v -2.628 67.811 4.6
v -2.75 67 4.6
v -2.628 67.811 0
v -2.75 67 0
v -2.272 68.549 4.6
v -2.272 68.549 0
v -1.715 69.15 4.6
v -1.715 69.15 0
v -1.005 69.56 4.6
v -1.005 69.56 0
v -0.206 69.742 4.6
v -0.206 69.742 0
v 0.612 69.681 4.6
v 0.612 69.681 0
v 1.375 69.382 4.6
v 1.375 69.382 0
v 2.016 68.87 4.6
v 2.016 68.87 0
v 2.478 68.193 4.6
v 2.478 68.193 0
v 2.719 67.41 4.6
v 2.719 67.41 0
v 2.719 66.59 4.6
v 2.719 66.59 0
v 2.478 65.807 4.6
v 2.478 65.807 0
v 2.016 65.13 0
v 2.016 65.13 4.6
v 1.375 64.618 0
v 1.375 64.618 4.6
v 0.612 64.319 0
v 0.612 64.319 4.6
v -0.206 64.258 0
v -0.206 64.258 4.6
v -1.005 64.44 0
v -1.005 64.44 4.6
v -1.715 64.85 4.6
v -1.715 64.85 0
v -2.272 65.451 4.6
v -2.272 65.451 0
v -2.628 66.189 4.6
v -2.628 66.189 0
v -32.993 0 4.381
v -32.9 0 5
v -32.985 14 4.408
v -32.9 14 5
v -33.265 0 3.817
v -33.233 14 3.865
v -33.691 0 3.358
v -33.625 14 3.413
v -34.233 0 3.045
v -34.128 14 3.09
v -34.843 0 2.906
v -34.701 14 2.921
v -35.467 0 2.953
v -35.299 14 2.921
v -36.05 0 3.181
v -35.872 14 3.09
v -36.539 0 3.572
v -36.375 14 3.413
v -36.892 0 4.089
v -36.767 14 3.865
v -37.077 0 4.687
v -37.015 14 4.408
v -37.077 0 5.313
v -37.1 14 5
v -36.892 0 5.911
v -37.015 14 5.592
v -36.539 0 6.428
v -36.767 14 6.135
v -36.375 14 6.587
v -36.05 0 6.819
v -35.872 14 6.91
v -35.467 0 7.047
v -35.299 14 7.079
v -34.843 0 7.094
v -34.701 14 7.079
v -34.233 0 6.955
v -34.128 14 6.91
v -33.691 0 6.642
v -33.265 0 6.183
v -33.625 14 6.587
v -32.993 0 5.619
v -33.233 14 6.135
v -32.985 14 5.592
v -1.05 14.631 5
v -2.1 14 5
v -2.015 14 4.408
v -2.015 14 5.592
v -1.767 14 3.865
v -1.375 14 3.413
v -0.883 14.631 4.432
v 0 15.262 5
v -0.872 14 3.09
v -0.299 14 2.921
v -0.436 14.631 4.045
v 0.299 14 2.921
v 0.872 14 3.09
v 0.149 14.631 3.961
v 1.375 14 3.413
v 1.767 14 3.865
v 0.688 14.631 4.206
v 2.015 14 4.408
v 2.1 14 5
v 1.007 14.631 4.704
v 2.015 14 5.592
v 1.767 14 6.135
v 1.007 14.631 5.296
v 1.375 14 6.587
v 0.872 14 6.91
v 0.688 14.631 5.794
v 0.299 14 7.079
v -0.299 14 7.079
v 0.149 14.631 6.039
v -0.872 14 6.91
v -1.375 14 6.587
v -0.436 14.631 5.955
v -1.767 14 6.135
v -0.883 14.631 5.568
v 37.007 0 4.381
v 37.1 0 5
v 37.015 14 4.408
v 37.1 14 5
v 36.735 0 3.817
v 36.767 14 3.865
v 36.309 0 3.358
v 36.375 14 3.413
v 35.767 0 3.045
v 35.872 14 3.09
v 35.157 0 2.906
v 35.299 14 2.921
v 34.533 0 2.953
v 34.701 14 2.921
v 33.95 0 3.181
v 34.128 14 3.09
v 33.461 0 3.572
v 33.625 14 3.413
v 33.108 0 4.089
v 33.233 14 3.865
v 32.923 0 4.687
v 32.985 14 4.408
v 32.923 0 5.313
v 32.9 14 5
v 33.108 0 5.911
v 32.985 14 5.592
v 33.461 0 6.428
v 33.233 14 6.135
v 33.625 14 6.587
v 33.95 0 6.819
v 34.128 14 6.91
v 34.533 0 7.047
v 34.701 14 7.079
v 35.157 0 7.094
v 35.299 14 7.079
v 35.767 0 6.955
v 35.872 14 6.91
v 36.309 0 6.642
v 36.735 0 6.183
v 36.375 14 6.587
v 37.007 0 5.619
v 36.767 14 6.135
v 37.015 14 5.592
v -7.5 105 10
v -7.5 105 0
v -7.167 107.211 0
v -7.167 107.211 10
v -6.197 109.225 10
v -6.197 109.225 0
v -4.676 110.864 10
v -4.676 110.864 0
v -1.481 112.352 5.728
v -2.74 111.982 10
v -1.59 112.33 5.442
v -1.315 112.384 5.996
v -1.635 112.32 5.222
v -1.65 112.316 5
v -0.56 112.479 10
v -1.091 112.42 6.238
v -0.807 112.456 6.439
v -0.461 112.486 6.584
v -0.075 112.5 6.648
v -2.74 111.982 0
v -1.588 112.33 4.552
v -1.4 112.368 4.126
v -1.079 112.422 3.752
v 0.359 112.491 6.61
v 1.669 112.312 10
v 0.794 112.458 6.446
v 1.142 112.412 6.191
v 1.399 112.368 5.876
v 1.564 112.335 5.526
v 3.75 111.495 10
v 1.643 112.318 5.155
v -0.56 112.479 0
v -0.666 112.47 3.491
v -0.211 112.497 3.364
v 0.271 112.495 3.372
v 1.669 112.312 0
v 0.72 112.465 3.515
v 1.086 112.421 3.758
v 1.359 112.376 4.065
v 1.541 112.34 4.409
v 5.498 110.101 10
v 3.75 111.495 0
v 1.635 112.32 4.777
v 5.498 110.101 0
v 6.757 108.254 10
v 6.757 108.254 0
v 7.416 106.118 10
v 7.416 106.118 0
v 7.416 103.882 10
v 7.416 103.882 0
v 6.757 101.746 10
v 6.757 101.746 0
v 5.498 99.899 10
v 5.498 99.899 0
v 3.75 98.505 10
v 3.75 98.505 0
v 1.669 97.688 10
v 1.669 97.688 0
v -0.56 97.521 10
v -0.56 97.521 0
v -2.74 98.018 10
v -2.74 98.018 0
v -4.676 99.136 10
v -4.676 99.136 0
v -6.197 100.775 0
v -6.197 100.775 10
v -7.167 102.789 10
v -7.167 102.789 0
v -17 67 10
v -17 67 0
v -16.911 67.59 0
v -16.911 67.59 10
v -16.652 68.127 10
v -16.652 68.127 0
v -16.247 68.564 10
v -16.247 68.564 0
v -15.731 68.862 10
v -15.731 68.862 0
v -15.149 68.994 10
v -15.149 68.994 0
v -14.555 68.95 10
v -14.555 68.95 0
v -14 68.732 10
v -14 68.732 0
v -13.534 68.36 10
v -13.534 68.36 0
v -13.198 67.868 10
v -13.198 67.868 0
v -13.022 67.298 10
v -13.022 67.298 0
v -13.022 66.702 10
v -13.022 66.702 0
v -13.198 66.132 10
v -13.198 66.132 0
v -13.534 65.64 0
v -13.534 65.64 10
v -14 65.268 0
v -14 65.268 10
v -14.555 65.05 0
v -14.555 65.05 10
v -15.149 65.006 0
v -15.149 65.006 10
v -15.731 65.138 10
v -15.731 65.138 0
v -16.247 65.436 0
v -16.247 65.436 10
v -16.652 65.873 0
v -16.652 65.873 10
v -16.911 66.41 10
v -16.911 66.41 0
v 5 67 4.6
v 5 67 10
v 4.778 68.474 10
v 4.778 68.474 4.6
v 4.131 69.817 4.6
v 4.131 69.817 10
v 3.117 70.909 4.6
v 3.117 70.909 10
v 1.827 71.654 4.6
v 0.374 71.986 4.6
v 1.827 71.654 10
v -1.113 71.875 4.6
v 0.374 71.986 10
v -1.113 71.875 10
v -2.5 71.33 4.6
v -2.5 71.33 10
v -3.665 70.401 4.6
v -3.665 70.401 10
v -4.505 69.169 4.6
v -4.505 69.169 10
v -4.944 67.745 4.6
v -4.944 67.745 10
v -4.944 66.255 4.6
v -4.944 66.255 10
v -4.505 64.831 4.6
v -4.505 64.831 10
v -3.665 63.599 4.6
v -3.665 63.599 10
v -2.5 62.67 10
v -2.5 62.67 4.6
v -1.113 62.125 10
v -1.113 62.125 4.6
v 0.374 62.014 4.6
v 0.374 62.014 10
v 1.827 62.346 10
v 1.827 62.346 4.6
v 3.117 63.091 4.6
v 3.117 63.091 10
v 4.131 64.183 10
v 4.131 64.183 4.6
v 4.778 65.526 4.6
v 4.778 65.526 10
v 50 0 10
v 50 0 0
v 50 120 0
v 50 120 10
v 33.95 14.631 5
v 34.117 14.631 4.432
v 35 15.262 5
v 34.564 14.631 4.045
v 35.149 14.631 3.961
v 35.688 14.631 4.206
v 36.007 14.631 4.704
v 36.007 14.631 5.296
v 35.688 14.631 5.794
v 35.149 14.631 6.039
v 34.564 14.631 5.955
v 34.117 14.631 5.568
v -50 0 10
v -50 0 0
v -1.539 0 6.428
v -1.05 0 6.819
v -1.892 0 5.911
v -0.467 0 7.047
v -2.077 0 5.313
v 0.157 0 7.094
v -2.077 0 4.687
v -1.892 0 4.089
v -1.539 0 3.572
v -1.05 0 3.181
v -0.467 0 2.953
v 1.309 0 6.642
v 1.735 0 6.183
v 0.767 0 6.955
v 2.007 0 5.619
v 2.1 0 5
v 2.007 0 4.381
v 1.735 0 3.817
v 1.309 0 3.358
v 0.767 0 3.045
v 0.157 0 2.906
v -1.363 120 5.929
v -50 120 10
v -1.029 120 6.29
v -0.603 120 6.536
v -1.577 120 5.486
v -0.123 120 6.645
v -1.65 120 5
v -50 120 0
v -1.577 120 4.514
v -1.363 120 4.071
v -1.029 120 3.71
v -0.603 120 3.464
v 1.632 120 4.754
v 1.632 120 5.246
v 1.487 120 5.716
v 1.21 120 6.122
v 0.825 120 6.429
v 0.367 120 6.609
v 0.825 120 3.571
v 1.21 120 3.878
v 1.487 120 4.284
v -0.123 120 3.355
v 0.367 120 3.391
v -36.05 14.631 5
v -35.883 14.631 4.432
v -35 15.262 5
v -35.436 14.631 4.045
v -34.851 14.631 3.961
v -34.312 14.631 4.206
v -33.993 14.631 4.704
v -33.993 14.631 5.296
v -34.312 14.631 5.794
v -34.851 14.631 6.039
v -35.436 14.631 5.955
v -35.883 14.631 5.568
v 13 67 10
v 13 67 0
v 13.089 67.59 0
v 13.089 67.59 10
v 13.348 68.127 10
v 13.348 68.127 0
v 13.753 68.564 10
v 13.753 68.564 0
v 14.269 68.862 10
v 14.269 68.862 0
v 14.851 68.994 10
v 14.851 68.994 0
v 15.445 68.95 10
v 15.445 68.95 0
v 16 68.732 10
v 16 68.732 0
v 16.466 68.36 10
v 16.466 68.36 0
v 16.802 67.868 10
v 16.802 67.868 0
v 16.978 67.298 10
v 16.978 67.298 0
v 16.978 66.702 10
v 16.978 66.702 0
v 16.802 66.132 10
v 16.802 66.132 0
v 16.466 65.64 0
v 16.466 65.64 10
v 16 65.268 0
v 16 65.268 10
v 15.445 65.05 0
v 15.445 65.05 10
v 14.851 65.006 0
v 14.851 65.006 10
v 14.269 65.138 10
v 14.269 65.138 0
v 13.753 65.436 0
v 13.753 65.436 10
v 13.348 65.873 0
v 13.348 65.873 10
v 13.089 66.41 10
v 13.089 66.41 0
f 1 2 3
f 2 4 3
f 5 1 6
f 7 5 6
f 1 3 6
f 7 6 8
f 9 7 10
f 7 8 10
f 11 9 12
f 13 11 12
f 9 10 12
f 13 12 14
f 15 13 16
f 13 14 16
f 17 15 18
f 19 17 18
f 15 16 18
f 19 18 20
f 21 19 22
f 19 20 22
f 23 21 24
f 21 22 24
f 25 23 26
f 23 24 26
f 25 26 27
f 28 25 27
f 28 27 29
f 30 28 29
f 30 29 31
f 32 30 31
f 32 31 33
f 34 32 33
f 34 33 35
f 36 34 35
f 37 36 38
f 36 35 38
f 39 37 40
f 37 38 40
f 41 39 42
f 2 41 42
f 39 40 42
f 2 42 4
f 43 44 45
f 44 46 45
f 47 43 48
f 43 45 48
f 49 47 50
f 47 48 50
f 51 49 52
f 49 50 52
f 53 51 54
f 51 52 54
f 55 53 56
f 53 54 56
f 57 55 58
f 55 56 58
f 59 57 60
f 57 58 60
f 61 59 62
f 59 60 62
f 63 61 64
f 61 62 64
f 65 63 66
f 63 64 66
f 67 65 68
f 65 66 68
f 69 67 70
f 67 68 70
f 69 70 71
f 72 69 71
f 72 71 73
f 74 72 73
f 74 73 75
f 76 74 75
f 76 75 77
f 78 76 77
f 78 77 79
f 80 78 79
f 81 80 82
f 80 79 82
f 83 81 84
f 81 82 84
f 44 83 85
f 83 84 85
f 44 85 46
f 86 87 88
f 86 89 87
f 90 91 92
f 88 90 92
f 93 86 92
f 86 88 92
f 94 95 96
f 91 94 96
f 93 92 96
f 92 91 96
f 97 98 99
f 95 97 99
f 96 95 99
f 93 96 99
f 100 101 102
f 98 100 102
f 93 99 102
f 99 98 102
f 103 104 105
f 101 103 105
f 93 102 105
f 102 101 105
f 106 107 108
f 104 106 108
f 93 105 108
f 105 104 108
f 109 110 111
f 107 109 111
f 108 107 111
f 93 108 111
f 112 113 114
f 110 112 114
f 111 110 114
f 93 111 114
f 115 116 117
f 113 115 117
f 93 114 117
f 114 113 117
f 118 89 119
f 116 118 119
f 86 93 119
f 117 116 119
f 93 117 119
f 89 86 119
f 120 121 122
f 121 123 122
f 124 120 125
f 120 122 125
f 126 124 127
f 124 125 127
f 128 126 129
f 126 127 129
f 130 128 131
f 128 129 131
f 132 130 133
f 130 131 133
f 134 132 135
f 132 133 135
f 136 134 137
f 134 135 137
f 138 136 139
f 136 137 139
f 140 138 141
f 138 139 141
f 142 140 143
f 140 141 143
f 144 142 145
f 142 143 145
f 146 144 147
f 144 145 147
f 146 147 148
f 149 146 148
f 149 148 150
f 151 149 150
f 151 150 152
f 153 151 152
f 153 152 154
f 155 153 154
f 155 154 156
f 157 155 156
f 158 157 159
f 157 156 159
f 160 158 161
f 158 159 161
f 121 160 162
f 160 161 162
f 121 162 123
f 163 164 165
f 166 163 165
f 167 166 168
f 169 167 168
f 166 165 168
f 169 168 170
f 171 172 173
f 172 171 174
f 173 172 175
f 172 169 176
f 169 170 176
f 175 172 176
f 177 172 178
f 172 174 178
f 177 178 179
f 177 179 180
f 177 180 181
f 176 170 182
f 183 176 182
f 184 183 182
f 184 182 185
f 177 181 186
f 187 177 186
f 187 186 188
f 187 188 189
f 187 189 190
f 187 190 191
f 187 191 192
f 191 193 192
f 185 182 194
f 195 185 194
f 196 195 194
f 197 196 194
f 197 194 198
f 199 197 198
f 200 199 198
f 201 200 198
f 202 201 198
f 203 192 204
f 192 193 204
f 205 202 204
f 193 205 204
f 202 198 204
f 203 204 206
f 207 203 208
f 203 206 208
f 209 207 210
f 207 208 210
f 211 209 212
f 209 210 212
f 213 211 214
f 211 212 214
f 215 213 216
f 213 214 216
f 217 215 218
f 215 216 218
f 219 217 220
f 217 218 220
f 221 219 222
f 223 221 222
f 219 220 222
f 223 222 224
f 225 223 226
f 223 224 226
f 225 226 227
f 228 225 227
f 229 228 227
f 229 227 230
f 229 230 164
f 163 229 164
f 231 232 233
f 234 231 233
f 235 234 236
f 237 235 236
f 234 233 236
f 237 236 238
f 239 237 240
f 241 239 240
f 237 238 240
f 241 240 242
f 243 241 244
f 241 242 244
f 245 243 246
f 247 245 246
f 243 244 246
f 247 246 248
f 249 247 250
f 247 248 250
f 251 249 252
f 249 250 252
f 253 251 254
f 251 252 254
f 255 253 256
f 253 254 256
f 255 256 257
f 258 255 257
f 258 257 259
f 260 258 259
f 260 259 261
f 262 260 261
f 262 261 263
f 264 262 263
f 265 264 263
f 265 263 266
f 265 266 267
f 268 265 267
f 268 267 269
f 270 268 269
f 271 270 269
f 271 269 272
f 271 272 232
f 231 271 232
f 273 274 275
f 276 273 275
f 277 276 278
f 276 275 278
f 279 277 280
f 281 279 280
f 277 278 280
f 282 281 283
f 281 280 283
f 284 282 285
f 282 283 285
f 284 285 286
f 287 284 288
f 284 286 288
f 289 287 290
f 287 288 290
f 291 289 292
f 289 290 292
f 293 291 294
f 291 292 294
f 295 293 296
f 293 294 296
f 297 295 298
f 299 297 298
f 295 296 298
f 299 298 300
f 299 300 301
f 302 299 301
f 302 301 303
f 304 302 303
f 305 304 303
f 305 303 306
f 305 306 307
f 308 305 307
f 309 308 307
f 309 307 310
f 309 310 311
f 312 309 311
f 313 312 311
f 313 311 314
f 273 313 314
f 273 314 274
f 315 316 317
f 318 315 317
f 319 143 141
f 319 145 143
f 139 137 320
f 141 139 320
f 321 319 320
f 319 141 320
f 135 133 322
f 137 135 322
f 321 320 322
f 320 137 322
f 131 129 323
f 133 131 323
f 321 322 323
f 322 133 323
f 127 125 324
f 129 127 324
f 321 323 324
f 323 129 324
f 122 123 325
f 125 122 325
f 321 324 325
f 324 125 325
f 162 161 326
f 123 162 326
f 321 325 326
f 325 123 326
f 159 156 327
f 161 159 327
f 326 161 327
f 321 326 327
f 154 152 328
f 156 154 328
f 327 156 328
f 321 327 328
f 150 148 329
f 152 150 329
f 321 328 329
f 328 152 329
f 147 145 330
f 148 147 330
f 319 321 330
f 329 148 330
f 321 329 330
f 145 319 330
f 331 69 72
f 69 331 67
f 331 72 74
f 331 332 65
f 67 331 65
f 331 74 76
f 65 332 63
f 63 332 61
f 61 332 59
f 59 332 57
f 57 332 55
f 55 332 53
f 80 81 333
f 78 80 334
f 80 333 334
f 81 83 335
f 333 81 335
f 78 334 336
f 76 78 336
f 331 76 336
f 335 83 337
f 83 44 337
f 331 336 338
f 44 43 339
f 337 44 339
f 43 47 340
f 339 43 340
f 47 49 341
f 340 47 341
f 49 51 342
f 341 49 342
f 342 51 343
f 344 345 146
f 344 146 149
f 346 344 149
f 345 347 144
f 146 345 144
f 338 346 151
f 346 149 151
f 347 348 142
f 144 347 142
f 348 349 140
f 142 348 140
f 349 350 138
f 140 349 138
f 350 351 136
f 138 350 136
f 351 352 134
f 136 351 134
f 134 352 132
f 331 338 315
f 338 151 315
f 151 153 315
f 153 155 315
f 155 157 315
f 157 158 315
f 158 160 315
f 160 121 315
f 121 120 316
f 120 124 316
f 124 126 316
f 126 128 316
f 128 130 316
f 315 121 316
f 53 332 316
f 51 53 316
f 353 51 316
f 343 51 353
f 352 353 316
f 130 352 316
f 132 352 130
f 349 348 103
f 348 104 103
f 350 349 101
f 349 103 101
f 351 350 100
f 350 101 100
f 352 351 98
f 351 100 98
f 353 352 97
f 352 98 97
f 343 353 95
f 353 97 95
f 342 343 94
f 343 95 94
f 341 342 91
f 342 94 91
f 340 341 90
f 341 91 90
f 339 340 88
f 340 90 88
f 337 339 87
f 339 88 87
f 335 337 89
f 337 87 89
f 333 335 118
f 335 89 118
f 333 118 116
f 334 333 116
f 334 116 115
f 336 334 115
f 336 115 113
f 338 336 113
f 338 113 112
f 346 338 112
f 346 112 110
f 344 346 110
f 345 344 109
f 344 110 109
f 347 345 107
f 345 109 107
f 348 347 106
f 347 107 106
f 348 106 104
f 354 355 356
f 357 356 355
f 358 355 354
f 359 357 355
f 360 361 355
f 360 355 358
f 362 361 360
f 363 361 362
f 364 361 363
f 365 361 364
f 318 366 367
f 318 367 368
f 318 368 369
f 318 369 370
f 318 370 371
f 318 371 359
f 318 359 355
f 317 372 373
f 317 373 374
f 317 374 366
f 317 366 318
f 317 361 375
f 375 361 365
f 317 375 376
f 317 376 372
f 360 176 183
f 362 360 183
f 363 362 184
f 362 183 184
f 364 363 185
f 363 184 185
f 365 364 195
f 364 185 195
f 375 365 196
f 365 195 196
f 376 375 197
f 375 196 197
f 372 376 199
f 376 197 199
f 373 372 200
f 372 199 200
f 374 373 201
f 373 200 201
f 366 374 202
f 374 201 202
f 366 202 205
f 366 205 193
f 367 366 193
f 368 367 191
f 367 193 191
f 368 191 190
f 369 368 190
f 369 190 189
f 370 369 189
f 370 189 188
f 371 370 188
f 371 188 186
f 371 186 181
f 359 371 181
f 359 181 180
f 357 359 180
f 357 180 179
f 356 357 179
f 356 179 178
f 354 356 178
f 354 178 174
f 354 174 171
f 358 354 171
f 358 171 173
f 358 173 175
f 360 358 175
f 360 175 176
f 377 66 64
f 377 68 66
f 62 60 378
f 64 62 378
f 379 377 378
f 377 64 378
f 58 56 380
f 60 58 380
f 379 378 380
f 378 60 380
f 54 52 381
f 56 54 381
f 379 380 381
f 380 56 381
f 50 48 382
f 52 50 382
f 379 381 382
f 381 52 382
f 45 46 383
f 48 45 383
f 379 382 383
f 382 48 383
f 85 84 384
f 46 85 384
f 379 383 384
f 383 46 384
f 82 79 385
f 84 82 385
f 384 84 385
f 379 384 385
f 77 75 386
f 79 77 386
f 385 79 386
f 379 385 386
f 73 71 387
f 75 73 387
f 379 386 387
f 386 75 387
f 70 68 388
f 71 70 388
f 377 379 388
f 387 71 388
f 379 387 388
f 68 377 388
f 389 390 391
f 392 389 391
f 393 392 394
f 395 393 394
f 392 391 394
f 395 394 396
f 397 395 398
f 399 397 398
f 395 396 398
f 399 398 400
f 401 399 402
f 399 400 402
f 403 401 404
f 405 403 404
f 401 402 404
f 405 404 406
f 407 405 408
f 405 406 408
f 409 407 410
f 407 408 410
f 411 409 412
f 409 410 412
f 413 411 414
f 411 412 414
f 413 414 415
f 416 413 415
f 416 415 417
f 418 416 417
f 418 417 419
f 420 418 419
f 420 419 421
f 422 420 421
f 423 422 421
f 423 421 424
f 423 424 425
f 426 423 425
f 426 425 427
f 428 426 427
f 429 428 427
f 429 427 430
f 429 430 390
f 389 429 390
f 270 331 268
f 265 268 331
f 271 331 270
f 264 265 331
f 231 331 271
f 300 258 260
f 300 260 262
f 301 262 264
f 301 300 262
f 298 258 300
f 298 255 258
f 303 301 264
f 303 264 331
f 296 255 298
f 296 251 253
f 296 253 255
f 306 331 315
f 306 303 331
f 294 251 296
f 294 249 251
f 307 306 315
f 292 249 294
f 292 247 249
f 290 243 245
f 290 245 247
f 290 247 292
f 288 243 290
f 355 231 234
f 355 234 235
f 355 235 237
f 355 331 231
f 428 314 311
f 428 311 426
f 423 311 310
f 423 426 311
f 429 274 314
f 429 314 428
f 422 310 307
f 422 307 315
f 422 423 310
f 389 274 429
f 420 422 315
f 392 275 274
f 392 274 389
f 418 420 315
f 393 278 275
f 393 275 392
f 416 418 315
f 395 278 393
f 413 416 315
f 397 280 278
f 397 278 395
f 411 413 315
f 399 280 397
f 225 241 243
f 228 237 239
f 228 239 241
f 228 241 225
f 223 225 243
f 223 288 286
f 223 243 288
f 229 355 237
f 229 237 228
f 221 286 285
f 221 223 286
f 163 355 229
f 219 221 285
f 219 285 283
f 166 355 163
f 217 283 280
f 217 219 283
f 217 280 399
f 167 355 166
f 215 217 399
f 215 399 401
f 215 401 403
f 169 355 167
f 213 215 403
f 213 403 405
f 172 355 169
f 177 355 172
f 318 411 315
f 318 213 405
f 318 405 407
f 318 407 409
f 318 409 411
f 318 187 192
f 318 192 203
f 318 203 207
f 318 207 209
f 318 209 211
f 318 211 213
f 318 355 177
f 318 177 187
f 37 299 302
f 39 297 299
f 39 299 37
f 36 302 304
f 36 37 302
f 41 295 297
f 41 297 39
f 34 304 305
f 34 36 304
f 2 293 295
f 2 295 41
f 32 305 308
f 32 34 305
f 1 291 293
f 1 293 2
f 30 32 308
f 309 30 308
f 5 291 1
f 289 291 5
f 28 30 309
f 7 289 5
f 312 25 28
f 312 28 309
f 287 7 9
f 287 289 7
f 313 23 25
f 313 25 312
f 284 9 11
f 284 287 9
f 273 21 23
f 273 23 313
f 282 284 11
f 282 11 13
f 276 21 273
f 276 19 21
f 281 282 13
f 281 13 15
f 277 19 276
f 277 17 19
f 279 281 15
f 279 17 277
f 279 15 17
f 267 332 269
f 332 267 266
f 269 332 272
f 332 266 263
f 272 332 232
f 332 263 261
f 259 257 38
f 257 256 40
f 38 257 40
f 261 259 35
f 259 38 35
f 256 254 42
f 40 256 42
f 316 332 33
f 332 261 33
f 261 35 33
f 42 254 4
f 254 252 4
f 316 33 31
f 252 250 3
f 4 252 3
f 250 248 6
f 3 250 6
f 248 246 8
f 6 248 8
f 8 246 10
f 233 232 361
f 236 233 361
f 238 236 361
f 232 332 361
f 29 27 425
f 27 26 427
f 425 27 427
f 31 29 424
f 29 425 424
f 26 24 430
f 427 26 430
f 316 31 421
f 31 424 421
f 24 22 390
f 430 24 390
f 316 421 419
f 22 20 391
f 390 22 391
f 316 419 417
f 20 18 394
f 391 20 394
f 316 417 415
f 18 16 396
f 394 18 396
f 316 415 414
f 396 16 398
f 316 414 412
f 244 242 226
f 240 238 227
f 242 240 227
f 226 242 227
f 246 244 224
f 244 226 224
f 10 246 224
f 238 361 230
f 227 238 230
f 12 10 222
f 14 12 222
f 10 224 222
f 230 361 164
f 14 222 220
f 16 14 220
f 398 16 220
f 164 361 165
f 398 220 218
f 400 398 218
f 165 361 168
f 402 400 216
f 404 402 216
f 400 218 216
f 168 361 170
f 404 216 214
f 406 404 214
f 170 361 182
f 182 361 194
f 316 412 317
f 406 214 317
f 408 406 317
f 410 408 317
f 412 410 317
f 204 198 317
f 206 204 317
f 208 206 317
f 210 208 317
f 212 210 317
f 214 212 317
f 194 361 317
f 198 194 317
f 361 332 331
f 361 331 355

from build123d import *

# Parameters (mm, degrees)
SKIZZE1_W                                            = 100
SKIZZE1_H                                            = 120
AUFSATZ_LINEAR_AUSTRAGEN1_DEPTH                      = 10
F_15_0_15_DURCHMESSER_BOHRUNG1_D                     = 15
M5_GEWINDEBOHRUNG1_D                                 = 4.2
M5_GEWINDEBOHRUNG1_DEPTH                             = 14
M5_GEWINDEBOHRUNG1_TIP                               = 1.2618073
M4_GEWINDEBOHRUNG1_D                                 = 3.3
M4_GEWINDEBOHRUNG1_DEPTH                             = 11.5
M4_GEWINDEBOHRUNG1_TIP                               = 0.991420021
STIRNSENKUNG_F_R_M5_ZYLINDERSCHRAUBE_MIT_D           = 5.5
STIRNSENKUNG_F_R_M5_ZYLINDERSCHRAUBE_MIT_CBORE_D     = 10
STIRNSENKUNG_F_R_M5_ZYLINDERSCHRAUBE_MIT_CBORE_DEPTH = 5.4
F_4_0_4_DURCHMESSER_BOHRUNG2_D                       = 4


with BuildPart() as part:
    # Skizze1 → Aufsatz-Linear austragen1 (new body)
    with BuildSketch(Plane.XY):
        with Locations((0, 60)):
            Rectangle(SKIZZE1_W, SKIZZE1_H)
    extrude(amount=AUFSATZ_LINEAR_AUSTRAGEN1_DEPTH)

    # Ø15.0 (15) Durchmesser Bohrung1 (through all)
    with Locations(Plane.XY.offset(10)):
        with Locations((0, 105)):
            Hole(F_15_0_15_DURCHMESSER_BOHRUNG1_D / 2)

    # M5 Gewindebohrung1
    with Locations(Plane(origin=(0, 0, 0), x_dir=(-1, 0, 0), z_dir=(0, -1, 0))):
        with Locations((0, -5), (35, -5), (-35, -5)):
            Hole(M5_GEWINDEBOHRUNG1_D / 2, depth=M5_GEWINDEBOHRUNG1_DEPTH)
            with Locations((0, 0, -(M5_GEWINDEBOHRUNG1_DEPTH + M5_GEWINDEBOHRUNG1_TIP / 2))):  # 118° drill point
                Cone(0, M5_GEWINDEBOHRUNG1_D / 2, M5_GEWINDEBOHRUNG1_TIP, mode=Mode.SUBTRACT)

    # M4 Gewindebohrung1
    with Locations(Plane(origin=(0, 120, 0), x_dir=(1, 0, 0), z_dir=(0, 1, 0))):
        with Locations((0, -5)):
            Hole(M4_GEWINDEBOHRUNG1_D / 2, depth=M4_GEWINDEBOHRUNG1_DEPTH)
            with Locations((0, 0, -(M4_GEWINDEBOHRUNG1_DEPTH + M4_GEWINDEBOHRUNG1_TIP / 2))):  # 118° drill point
                Cone(0, M4_GEWINDEBOHRUNG1_D / 2, M4_GEWINDEBOHRUNG1_TIP, mode=Mode.SUBTRACT)

    # Stirnsenkung für M5 Zylinderschraube mit Innensechskant2 (through all)
    with Locations(Plane.XY.offset(10)):
        with Locations((0, 67)):
            CounterBoreHole(STIRNSENKUNG_F_R_M5_ZYLINDERSCHRAUBE_MIT_D / 2, STIRNSENKUNG_F_R_M5_ZYLINDERSCHRAUBE_MIT_CBORE_D / 2, STIRNSENKUNG_F_R_M5_ZYLINDERSCHRAUBE_MIT_CBORE_DEPTH)

    # Ø4.0 (4) Durchmesser Bohrung2 (through all)
    with Locations(Plane.XY.offset(10)):
        with Locations((15, 67), (-15, 67)):
            Hole(F_4_0_4_DURCHMESSER_BOHRUNG2_D / 2)


solid = part.part
